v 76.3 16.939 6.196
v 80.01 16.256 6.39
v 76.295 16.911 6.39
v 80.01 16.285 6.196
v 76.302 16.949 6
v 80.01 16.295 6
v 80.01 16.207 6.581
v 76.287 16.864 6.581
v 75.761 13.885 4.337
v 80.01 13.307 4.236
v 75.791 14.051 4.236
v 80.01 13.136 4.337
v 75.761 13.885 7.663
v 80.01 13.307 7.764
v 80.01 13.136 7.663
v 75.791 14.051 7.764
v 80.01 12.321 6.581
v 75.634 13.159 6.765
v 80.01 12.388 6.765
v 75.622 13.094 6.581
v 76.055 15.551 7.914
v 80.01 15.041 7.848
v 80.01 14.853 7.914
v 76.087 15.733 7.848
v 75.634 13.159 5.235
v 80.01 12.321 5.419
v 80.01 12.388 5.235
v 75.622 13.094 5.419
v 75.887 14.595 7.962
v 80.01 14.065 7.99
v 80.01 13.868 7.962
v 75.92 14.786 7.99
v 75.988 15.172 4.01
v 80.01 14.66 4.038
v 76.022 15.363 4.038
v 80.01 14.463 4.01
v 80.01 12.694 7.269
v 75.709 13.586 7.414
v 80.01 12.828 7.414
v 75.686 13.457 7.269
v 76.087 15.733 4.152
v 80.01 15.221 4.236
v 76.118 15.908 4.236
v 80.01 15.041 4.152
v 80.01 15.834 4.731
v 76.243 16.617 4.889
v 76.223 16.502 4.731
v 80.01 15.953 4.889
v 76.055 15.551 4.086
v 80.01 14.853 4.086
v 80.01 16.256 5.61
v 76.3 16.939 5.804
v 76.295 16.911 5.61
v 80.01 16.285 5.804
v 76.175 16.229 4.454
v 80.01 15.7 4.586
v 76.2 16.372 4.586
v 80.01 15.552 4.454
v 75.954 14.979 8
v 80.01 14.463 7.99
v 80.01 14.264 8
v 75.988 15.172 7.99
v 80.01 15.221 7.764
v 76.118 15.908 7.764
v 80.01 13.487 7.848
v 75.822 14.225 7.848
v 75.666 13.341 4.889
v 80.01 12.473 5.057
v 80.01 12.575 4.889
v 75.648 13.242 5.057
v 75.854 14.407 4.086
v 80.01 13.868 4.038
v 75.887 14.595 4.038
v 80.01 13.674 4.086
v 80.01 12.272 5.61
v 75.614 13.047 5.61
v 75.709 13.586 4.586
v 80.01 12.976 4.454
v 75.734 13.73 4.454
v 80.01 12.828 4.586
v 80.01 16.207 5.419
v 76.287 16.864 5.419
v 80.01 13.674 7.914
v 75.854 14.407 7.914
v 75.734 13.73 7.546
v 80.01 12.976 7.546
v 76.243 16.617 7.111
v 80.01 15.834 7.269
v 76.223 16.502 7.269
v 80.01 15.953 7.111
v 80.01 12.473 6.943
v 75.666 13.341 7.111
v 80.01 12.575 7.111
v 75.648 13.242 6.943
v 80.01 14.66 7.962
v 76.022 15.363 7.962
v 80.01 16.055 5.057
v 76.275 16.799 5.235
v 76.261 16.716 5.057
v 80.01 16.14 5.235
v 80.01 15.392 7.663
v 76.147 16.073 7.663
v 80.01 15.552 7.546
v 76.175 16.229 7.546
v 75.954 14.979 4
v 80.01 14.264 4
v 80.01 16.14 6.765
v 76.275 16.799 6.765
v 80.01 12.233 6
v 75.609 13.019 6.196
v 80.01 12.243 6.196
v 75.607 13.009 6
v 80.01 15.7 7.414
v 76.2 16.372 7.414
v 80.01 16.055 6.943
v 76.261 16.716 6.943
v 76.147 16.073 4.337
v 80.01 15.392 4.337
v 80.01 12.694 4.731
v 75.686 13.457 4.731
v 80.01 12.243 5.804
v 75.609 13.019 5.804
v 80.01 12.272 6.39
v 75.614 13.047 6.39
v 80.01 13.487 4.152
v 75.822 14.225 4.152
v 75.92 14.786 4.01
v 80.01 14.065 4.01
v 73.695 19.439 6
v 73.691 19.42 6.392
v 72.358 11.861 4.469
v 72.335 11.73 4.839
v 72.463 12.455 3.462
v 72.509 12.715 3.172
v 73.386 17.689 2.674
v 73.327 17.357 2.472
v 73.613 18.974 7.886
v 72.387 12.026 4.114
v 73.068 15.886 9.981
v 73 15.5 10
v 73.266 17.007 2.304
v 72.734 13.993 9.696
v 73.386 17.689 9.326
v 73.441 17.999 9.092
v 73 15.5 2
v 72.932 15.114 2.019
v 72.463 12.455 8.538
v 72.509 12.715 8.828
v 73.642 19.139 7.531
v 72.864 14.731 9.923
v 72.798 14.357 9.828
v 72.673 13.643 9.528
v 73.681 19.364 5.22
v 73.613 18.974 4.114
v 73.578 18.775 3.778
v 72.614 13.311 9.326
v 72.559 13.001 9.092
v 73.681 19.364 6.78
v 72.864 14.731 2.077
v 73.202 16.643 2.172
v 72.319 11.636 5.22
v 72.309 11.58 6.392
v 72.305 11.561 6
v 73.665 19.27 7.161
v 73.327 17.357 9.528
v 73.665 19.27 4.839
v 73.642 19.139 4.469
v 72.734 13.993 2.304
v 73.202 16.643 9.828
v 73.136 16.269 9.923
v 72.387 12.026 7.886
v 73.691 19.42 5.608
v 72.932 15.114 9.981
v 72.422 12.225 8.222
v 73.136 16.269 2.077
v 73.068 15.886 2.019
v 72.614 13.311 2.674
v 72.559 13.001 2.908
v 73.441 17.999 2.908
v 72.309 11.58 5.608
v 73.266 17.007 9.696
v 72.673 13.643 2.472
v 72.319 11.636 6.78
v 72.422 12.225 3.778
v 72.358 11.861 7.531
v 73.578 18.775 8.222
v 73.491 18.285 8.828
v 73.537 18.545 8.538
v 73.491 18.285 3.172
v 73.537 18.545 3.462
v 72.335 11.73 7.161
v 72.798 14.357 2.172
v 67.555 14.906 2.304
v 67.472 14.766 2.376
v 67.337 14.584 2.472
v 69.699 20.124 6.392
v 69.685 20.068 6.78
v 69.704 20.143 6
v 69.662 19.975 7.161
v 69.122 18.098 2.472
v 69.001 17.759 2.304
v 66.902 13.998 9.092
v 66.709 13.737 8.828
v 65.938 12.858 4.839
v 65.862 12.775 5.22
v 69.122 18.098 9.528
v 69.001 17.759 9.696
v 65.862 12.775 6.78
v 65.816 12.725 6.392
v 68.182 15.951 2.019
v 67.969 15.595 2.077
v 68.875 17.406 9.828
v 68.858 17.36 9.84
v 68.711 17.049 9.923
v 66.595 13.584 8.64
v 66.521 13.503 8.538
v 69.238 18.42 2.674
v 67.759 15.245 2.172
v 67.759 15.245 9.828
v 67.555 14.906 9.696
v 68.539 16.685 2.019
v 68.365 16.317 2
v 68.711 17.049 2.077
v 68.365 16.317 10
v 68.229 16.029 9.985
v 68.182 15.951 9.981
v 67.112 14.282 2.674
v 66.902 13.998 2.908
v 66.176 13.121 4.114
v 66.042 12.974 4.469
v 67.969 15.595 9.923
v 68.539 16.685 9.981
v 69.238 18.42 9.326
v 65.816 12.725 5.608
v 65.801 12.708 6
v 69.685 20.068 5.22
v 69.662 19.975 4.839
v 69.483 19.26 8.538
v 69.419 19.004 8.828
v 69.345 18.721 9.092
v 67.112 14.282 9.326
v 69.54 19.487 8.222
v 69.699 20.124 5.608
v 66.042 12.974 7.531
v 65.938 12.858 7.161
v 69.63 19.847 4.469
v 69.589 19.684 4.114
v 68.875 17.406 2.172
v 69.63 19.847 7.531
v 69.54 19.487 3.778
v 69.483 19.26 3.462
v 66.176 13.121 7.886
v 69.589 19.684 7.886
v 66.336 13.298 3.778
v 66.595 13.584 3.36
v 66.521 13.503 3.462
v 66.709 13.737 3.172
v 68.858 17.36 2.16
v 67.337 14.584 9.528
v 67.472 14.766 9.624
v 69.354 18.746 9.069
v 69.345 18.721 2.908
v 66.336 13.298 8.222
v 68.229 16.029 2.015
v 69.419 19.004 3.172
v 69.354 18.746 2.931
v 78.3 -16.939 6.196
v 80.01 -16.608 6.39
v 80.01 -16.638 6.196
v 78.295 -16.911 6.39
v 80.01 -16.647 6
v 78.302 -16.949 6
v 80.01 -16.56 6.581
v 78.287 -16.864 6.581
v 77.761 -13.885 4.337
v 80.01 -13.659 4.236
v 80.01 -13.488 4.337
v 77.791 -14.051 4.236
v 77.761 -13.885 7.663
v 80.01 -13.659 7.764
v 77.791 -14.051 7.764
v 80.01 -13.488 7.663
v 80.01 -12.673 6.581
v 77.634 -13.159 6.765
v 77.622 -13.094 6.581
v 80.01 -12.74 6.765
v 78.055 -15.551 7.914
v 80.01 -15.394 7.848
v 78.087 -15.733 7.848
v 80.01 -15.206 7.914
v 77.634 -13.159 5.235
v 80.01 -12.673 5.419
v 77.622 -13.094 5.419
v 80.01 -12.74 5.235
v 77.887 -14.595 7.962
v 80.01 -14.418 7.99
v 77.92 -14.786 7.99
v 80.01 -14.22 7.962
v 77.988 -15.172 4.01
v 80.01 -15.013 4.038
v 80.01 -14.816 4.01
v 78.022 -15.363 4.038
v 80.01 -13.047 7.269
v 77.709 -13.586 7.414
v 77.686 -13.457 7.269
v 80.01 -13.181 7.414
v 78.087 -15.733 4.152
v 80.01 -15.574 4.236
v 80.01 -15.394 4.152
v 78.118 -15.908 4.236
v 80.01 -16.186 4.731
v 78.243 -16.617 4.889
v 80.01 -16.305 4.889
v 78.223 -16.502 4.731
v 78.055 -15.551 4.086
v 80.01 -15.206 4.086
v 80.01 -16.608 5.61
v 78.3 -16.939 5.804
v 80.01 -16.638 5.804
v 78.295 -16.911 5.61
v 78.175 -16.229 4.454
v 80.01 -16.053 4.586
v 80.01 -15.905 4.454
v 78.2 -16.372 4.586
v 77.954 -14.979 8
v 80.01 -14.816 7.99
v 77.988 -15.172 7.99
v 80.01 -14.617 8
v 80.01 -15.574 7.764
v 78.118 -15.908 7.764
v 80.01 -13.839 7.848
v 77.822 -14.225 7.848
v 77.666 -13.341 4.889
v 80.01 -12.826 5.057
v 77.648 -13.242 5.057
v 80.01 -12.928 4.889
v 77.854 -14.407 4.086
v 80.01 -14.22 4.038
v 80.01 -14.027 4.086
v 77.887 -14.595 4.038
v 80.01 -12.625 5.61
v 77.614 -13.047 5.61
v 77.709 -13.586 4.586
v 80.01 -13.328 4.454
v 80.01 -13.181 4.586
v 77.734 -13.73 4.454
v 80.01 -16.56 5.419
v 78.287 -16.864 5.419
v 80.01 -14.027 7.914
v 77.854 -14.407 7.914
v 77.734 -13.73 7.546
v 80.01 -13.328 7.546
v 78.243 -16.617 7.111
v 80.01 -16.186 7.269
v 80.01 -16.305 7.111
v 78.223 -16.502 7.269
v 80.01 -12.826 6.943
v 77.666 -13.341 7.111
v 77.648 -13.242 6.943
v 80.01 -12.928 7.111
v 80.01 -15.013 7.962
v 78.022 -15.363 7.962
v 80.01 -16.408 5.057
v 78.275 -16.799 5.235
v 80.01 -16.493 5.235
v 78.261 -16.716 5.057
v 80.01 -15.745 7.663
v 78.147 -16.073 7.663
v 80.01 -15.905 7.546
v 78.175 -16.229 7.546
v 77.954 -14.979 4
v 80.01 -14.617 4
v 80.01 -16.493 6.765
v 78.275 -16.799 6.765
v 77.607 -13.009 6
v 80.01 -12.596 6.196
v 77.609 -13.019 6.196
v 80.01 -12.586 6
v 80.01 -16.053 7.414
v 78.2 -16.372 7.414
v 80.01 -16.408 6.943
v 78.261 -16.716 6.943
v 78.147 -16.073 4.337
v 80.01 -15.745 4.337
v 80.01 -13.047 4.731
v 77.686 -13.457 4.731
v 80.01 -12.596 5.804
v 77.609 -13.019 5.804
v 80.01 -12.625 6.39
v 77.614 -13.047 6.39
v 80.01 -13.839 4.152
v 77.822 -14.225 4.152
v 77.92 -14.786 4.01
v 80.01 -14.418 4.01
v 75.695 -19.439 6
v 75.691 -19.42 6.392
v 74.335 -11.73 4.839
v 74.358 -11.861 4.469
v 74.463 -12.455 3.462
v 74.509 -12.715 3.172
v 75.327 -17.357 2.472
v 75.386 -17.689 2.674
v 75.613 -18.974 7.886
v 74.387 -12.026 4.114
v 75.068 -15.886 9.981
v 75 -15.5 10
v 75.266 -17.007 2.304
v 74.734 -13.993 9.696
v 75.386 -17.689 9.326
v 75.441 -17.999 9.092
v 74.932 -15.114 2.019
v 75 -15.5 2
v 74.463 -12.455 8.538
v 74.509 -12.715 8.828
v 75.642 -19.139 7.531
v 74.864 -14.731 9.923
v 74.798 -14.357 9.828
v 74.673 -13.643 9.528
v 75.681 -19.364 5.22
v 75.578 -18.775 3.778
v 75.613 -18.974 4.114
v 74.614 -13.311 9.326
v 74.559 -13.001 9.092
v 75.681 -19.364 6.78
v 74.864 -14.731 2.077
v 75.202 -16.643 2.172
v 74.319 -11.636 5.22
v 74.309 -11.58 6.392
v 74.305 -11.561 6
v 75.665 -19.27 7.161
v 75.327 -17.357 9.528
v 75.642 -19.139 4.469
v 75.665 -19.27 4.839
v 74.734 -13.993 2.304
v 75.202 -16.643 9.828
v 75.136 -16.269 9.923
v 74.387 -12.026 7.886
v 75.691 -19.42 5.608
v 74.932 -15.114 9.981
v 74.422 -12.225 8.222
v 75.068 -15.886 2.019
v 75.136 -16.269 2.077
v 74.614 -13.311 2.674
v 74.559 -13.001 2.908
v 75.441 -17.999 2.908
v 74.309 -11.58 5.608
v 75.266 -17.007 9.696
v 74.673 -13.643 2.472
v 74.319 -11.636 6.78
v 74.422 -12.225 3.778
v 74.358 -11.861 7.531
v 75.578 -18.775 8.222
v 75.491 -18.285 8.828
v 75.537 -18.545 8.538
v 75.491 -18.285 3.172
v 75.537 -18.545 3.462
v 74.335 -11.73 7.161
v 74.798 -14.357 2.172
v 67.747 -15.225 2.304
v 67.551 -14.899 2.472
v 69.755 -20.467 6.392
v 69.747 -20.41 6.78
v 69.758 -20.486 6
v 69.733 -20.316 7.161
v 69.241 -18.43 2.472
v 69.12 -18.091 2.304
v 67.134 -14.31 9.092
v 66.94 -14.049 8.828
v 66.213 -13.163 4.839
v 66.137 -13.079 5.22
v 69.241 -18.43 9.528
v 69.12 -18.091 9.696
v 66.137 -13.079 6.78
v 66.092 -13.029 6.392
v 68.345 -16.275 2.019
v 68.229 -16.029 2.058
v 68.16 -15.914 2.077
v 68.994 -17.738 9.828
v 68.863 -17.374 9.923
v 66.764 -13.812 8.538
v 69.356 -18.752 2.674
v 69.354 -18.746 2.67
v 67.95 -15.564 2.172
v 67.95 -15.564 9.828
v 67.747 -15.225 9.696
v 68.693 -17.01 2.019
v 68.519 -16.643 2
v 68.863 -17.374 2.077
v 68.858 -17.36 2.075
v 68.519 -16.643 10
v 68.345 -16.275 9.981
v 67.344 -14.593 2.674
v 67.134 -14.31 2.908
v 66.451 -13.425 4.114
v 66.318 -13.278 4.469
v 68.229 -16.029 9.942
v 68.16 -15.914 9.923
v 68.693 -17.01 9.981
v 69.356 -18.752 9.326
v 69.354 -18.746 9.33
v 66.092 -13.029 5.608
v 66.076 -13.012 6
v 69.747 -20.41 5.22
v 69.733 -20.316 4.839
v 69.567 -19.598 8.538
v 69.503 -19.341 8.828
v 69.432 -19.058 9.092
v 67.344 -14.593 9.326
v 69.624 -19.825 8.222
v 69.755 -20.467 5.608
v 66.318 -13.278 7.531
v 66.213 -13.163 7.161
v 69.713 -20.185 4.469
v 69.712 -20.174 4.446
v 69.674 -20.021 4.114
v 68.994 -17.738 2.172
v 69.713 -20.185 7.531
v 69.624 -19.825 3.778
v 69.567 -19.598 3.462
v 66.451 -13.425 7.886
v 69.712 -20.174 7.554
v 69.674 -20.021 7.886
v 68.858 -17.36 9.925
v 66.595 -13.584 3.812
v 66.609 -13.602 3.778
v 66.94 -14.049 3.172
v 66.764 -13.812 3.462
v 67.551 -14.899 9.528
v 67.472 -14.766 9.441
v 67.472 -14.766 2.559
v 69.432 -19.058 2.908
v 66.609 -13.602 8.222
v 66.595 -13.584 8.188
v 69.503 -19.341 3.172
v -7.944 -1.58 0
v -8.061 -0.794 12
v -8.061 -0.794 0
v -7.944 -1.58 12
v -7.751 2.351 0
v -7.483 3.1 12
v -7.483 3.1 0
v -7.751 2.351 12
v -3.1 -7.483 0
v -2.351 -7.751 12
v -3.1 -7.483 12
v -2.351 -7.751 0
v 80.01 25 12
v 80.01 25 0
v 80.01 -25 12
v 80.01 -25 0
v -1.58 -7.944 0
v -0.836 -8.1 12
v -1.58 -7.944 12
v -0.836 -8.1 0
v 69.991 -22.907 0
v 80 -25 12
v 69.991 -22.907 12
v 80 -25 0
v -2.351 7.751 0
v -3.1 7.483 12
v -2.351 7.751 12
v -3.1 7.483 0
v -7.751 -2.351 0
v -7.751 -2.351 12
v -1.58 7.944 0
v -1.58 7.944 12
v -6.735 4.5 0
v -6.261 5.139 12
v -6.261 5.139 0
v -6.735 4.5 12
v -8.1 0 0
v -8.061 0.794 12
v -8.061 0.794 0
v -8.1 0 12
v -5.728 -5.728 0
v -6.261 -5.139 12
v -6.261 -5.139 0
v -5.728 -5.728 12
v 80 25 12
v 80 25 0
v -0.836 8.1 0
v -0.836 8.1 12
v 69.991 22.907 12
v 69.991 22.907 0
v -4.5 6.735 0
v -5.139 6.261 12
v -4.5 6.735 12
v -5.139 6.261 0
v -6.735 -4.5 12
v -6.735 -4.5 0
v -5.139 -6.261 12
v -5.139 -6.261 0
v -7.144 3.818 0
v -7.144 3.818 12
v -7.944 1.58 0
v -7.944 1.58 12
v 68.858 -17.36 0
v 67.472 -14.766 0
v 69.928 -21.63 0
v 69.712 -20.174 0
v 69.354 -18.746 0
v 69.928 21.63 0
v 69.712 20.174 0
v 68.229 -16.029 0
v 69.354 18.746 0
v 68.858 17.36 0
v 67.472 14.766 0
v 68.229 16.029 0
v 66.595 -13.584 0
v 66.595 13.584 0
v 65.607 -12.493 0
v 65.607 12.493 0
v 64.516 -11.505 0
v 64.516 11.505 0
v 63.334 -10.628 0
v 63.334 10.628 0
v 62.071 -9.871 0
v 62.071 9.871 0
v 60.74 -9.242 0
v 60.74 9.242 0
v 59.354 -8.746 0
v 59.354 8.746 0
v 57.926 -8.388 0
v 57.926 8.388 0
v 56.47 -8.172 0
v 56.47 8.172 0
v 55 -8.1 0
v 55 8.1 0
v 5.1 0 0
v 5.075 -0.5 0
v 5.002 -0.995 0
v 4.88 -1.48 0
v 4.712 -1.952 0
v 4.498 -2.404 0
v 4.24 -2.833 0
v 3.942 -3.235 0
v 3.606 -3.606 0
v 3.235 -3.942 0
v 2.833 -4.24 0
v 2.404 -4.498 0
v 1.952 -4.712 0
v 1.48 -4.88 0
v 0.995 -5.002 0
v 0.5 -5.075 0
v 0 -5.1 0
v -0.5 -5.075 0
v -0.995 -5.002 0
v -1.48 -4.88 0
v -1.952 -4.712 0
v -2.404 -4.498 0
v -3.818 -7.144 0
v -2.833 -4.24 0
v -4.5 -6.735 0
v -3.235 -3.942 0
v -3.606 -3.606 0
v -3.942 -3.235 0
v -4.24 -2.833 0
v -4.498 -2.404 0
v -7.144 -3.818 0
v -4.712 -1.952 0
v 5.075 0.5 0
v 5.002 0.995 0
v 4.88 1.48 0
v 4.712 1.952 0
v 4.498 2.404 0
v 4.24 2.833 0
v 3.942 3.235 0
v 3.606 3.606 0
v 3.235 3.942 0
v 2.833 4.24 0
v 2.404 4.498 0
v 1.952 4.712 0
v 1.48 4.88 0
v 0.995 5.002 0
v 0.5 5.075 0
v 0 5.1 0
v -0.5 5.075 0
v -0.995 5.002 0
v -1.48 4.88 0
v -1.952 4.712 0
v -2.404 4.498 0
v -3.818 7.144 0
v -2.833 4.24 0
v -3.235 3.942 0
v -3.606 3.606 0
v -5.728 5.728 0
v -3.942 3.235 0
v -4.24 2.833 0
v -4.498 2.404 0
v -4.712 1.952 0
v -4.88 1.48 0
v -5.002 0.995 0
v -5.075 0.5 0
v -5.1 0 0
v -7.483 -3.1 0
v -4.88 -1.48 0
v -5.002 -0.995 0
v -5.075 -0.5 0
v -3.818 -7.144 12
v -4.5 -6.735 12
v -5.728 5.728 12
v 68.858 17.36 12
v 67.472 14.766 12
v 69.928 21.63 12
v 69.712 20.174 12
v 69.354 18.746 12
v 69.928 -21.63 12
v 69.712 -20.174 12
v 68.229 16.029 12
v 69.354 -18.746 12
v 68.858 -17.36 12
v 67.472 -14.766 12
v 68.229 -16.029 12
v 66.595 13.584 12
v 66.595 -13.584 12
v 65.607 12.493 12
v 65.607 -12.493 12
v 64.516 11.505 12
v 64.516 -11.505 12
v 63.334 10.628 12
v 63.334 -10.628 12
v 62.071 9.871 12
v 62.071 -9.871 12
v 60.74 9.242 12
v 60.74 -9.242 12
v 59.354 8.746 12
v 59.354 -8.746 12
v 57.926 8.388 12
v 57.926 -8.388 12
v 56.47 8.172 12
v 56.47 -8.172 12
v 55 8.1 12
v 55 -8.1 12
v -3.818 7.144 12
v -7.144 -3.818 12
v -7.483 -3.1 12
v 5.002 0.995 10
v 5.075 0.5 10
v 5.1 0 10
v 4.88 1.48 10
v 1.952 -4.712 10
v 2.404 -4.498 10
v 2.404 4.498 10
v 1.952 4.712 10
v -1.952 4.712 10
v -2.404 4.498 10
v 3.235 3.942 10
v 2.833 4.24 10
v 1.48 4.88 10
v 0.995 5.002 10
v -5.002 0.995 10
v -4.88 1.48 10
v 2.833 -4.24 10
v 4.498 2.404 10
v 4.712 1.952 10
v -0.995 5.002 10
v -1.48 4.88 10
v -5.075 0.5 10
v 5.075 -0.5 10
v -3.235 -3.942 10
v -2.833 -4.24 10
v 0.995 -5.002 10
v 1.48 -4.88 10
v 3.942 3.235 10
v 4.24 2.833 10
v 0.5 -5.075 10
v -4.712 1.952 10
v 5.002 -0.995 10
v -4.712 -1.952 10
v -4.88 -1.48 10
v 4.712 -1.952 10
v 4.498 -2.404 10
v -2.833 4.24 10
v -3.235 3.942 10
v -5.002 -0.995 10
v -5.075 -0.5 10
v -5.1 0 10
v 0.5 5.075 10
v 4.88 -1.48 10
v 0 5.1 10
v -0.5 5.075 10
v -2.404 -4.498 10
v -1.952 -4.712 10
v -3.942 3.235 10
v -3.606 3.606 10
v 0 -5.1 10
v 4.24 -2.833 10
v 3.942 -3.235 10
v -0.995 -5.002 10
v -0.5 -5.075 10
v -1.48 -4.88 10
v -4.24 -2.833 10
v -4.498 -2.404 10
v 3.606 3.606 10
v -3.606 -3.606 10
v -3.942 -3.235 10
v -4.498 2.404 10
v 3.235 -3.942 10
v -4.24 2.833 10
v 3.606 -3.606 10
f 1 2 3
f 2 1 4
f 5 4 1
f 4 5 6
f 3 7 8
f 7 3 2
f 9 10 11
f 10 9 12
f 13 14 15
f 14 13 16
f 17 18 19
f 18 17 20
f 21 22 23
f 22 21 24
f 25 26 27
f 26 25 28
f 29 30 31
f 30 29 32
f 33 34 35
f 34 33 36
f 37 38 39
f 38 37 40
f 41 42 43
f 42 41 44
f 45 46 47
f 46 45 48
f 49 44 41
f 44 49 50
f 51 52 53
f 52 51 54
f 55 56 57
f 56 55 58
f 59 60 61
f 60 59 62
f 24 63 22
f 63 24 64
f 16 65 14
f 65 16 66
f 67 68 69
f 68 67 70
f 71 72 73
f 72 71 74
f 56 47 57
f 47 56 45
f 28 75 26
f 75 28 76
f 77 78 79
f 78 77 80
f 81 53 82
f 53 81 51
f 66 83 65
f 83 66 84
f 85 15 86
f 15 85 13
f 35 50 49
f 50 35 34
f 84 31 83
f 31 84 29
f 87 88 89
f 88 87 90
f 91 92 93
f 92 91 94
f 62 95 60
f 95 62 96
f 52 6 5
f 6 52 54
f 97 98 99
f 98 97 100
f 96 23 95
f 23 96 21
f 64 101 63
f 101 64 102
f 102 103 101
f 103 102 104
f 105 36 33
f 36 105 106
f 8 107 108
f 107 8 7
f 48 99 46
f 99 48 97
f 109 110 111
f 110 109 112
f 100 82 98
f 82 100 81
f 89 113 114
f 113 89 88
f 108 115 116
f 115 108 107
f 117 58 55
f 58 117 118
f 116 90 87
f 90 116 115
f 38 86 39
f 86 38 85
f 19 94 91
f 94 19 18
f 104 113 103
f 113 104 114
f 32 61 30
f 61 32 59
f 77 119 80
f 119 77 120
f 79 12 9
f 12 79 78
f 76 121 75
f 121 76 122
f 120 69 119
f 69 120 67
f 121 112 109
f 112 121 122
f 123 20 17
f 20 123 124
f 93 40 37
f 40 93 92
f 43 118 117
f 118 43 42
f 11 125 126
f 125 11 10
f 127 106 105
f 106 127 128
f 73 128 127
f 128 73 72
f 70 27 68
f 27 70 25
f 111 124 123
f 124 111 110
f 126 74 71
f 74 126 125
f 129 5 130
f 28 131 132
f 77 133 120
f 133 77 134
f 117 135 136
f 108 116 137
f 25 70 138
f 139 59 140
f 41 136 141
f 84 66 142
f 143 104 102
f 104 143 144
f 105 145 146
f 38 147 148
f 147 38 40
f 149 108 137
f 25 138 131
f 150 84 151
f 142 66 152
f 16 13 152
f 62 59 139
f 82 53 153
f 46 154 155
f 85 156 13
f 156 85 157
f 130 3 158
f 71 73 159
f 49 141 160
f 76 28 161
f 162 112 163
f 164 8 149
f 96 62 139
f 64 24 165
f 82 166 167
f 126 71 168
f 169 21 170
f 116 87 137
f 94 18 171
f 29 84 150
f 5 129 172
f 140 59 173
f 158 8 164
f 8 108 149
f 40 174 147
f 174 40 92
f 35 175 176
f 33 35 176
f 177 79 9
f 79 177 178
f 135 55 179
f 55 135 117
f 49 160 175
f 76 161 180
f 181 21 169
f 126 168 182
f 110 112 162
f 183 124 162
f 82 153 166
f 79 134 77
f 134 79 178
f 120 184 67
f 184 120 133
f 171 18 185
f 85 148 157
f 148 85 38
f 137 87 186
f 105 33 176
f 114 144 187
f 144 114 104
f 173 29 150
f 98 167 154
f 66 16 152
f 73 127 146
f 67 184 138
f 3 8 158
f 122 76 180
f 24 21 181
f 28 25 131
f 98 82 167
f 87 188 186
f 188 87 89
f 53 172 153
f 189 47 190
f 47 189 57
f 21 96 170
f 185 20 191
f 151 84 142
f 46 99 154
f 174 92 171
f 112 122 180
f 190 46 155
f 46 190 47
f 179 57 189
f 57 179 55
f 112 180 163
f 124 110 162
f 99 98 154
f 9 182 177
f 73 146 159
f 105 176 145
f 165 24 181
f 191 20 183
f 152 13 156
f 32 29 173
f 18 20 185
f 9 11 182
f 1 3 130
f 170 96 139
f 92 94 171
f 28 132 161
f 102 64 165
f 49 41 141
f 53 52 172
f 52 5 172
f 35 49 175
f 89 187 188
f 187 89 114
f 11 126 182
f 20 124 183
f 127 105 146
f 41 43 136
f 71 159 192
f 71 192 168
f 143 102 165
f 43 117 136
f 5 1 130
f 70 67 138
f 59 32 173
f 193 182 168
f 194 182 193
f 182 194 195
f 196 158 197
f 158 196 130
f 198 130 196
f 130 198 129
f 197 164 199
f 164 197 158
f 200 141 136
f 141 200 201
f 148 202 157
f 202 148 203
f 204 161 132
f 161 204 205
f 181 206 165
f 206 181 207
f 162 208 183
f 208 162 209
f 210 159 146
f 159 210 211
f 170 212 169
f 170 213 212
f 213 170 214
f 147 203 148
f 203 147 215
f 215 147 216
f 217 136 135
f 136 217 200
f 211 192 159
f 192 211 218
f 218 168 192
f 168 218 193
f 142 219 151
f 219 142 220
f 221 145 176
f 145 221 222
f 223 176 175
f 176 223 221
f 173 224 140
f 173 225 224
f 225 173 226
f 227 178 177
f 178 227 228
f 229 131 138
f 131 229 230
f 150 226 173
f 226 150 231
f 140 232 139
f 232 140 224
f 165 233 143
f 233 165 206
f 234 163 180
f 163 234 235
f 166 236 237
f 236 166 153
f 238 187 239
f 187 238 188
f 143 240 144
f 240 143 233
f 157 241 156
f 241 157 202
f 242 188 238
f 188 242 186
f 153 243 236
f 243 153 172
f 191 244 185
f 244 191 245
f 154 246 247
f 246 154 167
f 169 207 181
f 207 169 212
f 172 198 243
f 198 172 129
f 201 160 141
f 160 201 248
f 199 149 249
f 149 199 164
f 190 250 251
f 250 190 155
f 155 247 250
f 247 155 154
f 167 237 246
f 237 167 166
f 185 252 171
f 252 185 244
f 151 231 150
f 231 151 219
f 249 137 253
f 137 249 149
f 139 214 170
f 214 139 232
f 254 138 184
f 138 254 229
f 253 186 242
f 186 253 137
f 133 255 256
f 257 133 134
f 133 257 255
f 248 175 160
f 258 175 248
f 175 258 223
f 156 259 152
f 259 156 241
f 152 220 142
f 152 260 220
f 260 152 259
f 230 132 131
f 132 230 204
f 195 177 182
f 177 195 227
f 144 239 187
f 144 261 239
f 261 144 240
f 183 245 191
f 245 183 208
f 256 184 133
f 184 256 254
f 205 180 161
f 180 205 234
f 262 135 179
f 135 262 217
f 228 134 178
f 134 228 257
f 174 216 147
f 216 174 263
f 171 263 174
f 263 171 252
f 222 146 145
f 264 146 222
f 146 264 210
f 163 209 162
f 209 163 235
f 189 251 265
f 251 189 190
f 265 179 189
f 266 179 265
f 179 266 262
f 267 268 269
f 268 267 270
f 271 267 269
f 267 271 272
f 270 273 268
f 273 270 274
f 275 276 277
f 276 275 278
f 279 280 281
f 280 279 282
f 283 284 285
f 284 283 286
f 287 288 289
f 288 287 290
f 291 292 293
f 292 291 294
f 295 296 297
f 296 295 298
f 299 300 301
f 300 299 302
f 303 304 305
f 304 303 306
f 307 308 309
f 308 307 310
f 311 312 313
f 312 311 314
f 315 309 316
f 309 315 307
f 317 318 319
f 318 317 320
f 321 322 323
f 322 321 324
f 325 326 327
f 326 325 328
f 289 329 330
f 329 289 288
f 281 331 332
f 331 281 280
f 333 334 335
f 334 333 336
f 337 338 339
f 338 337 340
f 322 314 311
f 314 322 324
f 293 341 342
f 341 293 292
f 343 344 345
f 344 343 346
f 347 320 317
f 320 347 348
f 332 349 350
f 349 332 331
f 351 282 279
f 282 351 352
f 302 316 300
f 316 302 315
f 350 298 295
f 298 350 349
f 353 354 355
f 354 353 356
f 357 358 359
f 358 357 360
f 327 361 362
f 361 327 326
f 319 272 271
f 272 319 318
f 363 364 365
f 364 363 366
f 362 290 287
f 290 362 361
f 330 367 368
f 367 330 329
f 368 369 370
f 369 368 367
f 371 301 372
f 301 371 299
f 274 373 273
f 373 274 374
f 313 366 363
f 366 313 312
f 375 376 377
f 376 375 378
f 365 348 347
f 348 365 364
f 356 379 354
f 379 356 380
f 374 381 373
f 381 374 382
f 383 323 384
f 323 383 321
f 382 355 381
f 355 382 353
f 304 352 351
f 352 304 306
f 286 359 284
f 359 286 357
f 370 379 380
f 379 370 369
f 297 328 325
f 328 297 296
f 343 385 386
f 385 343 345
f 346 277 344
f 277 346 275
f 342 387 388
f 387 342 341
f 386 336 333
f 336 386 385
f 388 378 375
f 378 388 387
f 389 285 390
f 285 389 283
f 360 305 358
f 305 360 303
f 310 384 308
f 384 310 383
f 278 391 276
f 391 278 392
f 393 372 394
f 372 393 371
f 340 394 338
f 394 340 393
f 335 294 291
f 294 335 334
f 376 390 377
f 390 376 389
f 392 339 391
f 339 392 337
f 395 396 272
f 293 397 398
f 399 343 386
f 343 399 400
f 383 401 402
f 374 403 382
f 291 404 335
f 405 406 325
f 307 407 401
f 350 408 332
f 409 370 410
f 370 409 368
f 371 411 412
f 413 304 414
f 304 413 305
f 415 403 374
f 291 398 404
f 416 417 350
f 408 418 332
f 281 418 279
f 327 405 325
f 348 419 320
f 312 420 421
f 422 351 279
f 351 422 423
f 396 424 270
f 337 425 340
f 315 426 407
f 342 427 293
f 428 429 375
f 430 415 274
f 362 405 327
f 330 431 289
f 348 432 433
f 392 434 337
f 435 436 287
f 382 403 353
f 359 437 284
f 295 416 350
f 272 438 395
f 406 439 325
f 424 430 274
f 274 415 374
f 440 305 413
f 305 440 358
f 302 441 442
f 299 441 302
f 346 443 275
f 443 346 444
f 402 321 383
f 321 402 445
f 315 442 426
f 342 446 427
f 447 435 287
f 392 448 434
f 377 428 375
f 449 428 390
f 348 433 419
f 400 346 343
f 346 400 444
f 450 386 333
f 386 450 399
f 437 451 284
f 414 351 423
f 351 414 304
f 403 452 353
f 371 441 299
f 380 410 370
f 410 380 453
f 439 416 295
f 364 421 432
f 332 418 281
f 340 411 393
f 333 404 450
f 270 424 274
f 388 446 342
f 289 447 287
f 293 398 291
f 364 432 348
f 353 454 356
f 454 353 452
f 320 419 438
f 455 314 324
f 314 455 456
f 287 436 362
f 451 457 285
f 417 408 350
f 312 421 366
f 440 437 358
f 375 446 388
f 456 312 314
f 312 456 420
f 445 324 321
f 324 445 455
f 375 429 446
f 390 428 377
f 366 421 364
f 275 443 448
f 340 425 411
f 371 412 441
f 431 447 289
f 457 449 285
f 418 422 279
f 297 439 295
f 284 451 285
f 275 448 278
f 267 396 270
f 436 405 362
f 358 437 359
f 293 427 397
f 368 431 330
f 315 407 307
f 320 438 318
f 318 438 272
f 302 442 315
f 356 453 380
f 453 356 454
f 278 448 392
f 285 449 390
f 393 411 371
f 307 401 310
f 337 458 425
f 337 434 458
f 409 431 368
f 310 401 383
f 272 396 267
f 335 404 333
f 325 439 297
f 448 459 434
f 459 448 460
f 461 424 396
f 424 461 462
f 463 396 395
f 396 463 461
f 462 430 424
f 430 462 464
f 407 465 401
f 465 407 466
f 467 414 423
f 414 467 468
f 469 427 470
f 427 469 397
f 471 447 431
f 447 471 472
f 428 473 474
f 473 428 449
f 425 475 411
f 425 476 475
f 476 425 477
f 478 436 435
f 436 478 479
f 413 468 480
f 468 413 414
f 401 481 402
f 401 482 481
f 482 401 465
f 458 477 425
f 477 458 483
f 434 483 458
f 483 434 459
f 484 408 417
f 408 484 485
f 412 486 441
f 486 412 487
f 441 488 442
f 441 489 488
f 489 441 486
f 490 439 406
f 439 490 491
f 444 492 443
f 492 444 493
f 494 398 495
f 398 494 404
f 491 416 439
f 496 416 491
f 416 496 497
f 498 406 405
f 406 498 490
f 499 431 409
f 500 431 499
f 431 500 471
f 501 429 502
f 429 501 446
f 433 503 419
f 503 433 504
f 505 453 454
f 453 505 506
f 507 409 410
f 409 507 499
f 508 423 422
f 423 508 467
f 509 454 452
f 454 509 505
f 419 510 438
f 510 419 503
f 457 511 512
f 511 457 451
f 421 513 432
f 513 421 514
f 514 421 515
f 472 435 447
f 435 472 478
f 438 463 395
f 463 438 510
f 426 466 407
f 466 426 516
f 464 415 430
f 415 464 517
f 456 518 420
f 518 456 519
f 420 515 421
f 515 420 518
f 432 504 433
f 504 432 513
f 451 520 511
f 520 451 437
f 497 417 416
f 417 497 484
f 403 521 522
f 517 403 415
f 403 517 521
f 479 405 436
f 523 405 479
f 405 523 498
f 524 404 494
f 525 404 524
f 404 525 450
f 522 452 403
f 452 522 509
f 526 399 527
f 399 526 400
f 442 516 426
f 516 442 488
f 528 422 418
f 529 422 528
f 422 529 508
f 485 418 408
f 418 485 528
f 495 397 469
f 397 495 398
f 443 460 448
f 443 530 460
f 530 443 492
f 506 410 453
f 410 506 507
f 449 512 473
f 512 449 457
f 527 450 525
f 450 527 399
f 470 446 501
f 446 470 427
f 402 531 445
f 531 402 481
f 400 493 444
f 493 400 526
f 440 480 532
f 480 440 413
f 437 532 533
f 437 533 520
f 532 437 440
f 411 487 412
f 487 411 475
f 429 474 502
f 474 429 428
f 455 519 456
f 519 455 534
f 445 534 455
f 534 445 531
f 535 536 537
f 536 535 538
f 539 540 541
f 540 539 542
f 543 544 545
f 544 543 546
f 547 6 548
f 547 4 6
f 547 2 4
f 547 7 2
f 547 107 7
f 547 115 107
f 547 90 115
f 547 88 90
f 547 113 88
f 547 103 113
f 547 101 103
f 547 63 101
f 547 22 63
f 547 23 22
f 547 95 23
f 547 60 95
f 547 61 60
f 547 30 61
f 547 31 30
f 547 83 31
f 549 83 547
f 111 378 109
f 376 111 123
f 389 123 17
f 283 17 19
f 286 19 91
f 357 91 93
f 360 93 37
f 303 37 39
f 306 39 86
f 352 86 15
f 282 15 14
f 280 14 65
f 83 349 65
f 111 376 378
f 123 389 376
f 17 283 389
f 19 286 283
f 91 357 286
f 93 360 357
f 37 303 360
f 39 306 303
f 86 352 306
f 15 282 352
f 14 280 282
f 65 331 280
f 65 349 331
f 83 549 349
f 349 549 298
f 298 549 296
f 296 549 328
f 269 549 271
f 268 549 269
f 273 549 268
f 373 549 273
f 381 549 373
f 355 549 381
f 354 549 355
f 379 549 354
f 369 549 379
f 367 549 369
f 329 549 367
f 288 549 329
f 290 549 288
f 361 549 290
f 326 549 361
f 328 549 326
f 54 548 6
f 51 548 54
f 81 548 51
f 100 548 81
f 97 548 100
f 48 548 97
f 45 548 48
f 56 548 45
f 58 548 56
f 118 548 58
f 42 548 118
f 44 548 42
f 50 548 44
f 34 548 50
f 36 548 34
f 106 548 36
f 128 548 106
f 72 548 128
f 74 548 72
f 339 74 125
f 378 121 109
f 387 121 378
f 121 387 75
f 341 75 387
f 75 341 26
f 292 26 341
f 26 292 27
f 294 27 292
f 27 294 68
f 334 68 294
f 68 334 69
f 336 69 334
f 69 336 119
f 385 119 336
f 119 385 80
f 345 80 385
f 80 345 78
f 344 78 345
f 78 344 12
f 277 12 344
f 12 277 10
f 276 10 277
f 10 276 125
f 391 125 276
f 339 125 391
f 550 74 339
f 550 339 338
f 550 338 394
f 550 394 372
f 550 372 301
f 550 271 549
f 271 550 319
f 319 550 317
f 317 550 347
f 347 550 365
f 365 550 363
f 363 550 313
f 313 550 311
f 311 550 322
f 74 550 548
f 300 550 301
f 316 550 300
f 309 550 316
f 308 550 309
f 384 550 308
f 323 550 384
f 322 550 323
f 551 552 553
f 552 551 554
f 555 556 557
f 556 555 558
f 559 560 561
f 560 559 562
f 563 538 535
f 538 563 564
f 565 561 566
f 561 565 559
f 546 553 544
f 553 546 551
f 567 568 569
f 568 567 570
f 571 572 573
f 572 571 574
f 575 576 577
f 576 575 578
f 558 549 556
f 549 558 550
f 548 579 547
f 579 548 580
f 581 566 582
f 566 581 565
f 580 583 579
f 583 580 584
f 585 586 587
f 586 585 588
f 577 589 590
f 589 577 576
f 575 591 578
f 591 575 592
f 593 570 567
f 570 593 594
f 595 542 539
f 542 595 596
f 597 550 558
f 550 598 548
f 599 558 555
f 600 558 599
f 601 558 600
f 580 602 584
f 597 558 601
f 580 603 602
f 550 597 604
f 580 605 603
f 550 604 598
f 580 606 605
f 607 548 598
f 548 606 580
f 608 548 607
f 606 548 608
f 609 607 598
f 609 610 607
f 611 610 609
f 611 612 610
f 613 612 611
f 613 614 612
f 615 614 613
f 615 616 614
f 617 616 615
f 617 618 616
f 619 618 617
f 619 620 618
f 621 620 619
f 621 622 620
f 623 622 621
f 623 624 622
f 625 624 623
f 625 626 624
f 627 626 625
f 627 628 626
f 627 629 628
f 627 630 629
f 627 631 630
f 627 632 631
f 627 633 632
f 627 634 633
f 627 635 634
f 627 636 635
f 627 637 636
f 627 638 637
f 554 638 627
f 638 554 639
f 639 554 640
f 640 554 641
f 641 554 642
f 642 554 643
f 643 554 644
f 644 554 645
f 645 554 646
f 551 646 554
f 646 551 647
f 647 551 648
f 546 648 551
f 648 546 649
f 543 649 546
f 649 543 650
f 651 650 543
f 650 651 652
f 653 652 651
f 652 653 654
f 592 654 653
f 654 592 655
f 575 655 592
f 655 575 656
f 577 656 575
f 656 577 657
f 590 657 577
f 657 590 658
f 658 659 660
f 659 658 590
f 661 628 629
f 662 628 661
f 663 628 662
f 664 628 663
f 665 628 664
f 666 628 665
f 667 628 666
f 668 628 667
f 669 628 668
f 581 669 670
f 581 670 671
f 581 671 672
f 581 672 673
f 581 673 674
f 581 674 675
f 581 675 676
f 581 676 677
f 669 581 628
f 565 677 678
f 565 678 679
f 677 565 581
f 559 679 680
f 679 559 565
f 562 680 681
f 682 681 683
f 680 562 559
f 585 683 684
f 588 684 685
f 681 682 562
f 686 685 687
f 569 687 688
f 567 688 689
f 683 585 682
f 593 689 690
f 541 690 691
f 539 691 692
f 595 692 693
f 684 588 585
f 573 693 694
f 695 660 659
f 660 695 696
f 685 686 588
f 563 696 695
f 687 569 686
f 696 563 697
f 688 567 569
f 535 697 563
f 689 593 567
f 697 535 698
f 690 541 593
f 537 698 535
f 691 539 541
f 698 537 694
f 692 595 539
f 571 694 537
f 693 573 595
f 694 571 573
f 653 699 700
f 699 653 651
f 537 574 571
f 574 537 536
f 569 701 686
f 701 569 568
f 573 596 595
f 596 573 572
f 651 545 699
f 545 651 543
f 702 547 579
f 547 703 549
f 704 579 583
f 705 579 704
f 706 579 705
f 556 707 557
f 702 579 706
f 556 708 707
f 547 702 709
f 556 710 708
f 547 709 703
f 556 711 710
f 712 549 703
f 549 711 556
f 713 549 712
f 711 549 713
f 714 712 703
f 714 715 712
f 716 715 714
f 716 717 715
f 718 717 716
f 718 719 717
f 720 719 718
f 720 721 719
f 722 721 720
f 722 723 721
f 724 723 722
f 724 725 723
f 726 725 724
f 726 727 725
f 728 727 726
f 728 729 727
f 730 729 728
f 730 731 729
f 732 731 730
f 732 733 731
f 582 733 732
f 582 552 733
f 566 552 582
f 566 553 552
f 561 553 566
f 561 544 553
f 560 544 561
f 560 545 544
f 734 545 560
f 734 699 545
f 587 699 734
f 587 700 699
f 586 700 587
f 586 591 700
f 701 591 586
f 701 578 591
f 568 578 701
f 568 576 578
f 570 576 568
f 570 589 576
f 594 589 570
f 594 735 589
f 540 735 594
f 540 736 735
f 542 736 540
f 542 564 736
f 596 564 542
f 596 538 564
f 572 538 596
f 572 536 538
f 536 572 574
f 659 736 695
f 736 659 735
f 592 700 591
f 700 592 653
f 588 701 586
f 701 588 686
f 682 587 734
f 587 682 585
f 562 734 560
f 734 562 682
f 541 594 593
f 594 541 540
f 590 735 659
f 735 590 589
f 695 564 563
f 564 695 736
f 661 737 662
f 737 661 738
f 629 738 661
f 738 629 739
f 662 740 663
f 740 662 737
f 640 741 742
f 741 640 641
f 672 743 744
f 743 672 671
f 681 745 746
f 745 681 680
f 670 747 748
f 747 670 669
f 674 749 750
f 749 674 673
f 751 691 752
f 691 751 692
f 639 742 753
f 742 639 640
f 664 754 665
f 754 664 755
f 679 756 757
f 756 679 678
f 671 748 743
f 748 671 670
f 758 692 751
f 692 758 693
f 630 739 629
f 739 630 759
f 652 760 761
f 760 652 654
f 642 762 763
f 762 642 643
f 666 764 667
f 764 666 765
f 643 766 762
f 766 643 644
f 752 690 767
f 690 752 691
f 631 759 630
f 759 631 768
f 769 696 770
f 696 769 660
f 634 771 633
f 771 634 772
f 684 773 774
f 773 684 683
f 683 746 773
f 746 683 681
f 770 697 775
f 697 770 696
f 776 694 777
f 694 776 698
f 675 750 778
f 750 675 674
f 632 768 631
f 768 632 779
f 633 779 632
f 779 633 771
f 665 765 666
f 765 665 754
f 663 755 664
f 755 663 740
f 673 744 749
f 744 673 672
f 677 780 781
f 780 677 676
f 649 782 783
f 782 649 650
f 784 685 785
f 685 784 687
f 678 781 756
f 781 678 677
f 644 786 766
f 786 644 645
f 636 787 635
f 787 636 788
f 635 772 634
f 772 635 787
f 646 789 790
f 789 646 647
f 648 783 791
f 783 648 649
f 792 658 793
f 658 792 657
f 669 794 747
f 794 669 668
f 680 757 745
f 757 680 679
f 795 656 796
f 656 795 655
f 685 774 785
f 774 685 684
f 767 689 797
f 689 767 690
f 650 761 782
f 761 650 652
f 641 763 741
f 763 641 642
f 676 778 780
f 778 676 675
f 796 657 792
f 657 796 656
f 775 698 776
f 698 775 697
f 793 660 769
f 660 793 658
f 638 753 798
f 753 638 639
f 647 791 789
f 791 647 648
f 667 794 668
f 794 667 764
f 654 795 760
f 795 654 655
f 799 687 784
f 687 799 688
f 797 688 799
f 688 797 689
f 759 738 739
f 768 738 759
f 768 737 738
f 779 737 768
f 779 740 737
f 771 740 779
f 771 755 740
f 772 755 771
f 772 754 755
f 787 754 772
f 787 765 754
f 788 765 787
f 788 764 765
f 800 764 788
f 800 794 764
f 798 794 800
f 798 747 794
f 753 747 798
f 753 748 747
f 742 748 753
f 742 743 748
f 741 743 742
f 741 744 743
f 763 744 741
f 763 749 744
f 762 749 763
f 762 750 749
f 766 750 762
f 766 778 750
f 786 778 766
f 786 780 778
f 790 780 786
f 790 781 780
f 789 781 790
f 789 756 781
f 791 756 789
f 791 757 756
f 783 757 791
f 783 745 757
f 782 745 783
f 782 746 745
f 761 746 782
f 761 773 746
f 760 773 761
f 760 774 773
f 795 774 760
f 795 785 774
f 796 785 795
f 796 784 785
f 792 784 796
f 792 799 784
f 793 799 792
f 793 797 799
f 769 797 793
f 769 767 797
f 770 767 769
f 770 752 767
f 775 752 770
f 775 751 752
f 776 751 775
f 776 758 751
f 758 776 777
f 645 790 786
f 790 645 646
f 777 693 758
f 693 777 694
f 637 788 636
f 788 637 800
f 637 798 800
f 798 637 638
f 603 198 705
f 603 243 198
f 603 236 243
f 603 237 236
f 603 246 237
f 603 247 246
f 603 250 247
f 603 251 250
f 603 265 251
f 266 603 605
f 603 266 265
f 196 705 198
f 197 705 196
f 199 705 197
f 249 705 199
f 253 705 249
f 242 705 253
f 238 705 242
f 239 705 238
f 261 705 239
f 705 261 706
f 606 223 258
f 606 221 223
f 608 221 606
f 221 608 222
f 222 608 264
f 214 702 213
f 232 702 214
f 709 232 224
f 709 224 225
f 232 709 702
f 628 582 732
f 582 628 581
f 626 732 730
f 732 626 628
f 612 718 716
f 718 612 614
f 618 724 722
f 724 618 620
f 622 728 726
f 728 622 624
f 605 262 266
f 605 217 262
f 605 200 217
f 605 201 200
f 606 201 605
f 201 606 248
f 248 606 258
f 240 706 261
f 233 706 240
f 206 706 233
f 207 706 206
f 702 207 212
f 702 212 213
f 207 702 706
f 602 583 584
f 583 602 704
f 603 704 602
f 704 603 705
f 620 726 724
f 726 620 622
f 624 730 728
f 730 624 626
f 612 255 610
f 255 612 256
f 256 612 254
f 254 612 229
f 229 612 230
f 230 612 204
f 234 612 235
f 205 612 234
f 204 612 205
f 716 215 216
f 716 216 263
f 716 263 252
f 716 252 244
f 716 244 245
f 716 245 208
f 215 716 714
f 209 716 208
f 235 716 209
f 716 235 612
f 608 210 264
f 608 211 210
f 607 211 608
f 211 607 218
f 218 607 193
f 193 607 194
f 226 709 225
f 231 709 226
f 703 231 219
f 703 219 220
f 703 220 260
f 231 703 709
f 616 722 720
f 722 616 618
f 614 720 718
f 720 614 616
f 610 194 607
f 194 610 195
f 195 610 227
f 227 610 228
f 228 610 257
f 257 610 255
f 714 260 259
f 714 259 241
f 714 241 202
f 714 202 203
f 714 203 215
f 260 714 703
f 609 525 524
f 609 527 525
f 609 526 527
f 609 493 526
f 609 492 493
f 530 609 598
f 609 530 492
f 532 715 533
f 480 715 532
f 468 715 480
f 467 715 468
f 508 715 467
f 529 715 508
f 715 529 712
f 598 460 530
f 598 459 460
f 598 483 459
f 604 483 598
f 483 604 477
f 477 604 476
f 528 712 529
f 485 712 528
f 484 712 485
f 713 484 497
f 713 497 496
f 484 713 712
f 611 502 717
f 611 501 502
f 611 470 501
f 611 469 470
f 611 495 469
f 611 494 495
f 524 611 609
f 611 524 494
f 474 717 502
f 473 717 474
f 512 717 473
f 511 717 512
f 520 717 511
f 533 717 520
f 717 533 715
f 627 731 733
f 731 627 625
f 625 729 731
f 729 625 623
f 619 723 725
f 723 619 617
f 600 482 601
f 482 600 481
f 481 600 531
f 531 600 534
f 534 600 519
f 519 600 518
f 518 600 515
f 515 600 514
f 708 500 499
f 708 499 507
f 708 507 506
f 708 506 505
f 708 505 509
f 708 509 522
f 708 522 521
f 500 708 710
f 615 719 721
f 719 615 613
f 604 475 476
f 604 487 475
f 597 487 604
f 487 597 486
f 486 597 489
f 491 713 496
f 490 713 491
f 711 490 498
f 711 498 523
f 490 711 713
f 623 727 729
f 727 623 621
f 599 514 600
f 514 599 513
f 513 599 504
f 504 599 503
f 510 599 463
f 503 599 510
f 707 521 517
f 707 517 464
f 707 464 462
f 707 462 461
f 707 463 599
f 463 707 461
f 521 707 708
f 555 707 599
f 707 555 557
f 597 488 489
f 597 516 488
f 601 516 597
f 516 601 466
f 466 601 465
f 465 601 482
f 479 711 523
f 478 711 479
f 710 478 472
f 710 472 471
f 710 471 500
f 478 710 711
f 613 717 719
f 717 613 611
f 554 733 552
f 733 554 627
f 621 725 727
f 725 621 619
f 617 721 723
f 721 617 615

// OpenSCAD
$fn=64;
Lw=80; //расстояние от стены
Dt=10.2; //диаметр трубки
DtH=10; //высота охвата трубки
WL=50;//длина планки
WH=10;//толщина планки
HH=DtH+2;

dOkr=30; //скругление у основания

//cylinder(d=Dt+3*2,h=DtH);
//translate([Lw,-WL/2,0])cube([WH,WL,DtH]);
module shHole(diam){
    cylinder(d=diam,h=40);
        cylinder(d1=diam+4,d2=diam,h=3);
        translate([0,0,-80])cylinder(d=diam+4,h=80);
}

difference(){
    hull(){
        cylinder(d=Dt+3*2,h=HH);
        scale([1,1,1])translate([Lw,-WL/2,0])cube([0.01,WL,HH]);
    }
    cylinder(d=Dt,h=DtH);
    translate([Lw-7,WL/4+3,HH/2])rotate([90,0,90-10]){
        shHole(4);
    }
    
    mirror([0,1,0])translate([Lw-5,WL/4+3,HH/2])rotate([90,0,90-10]){
        shHole(4);
    }
    
    
    
    hull(){
        
        translate([Lw-WH-dOkr/2,(Dt+6)/2+dOkr/2,-0.01])cylinder(d=dOkr,h=HH+0.02);
        translate([-10,(Dt+6)/2+dOkr/2,-0.01])cylinder(d=dOkr,h=HH+0.02);
        
        
    }
    mirror([0,1,0])hull(){
        translate([Lw-WH-dOkr/2,(Dt+6)/2+dOkr/2,-0.01])cylinder(d=dOkr,h=HH+0.02);
        translate([-10,(Dt+6)/2+dOkr/2,-0.01])cylinder(d=dOkr,h=HH+0.02);
        
    }
}
